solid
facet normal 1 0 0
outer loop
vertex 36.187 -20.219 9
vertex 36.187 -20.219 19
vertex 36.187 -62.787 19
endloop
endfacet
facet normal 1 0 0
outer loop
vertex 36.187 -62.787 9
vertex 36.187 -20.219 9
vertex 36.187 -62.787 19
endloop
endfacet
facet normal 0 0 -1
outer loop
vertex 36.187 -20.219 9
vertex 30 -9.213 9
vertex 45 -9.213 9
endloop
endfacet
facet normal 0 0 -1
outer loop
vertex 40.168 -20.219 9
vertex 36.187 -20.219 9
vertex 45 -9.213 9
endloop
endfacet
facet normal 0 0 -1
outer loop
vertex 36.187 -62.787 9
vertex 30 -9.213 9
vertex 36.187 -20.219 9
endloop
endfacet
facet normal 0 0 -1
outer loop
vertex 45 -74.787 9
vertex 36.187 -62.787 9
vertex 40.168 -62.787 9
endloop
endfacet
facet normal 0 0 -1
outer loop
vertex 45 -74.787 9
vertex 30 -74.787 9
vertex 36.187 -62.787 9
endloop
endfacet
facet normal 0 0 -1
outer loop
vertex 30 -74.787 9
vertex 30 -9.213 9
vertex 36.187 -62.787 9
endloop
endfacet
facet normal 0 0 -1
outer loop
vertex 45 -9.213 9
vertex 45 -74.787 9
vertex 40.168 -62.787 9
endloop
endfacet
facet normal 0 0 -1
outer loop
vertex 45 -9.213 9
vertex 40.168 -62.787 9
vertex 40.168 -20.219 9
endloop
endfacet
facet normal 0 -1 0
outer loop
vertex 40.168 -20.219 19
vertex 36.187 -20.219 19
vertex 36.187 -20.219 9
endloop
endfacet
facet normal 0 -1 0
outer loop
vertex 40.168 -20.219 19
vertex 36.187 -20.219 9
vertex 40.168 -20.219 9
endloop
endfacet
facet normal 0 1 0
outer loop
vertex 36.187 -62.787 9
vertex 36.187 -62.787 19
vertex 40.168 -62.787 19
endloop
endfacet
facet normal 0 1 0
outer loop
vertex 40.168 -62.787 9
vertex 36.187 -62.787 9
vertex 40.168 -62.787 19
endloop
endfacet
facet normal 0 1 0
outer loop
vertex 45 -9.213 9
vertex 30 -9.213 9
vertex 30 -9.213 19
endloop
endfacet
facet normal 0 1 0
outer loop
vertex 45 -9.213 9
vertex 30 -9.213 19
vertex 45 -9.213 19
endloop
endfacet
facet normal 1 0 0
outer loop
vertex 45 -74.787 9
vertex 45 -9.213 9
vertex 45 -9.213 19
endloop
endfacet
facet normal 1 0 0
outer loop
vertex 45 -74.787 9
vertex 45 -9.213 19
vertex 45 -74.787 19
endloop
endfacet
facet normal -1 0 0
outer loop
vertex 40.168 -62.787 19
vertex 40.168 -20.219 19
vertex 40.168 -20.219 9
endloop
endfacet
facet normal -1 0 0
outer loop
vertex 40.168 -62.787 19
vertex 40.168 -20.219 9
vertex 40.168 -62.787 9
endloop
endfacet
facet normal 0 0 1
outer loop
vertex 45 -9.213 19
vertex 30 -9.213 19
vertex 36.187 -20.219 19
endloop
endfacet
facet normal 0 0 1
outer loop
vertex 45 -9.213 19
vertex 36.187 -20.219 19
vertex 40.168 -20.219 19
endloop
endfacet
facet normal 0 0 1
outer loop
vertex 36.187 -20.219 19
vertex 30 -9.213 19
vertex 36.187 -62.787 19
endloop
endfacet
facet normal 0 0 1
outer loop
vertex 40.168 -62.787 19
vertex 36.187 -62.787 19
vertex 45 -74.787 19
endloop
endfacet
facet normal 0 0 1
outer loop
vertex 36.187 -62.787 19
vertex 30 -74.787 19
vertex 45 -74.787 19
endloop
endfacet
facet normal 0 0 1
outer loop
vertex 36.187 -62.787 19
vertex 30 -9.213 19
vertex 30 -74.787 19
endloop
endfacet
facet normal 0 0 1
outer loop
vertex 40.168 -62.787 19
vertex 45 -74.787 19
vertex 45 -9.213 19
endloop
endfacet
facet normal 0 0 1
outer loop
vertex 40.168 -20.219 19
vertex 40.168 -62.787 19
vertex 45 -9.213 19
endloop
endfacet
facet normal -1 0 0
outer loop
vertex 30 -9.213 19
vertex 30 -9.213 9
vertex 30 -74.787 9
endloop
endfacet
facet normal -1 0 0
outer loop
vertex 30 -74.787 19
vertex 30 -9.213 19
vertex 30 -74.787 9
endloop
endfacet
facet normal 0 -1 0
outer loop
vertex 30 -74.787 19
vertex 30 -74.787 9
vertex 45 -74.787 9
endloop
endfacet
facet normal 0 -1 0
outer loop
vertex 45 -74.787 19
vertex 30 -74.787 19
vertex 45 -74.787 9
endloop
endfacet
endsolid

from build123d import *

# Parameters (mm, degrees)
SKETCH024_W     = 15
SKETCH024_H     = 65.573825
PAD013_DEPTH    = 10
SKETCH025_W     = 3.980878
SKETCH025_H     = 42.568468
POCKET007_DEPTH = 10.001


with BuildPart() as pocket007:
    # Sketch024 → Pad013 (new body)
    with BuildSketch(Plane(origin=(65, 0, 9), x_dir=(1, 0, 0), z_dir=(0, 0, 1))):
        with Locations((-27.5, 42.000197)):
            Rectangle(SKETCH024_W, SKETCH024_H)
    extrude(amount=PAD013_DEPTH)

    # Sketch025 → Pocket007 (cut, through all)
    with BuildSketch(Plane(origin=(65, 0, 19), x_dir=(1, 0, 0), z_dir=(0, 0, 1))):
        with Locations((-26.822156, 41.502875)):
            Rectangle(SKETCH025_W, SKETCH025_H)
    extrude(amount=-POCKET007_DEPTH, mode=Mode.SUBTRACT)


with BuildPart() as part_mirroring001:
    # Part__Mirroring001: instance of Pocket007
    add(pocket007.part.mirror(Plane(origin=(0, 0, 0), x_dir=(1, 0, 0), z_dir=(0, 1, 0))))


solid = part_mirroring001.part
